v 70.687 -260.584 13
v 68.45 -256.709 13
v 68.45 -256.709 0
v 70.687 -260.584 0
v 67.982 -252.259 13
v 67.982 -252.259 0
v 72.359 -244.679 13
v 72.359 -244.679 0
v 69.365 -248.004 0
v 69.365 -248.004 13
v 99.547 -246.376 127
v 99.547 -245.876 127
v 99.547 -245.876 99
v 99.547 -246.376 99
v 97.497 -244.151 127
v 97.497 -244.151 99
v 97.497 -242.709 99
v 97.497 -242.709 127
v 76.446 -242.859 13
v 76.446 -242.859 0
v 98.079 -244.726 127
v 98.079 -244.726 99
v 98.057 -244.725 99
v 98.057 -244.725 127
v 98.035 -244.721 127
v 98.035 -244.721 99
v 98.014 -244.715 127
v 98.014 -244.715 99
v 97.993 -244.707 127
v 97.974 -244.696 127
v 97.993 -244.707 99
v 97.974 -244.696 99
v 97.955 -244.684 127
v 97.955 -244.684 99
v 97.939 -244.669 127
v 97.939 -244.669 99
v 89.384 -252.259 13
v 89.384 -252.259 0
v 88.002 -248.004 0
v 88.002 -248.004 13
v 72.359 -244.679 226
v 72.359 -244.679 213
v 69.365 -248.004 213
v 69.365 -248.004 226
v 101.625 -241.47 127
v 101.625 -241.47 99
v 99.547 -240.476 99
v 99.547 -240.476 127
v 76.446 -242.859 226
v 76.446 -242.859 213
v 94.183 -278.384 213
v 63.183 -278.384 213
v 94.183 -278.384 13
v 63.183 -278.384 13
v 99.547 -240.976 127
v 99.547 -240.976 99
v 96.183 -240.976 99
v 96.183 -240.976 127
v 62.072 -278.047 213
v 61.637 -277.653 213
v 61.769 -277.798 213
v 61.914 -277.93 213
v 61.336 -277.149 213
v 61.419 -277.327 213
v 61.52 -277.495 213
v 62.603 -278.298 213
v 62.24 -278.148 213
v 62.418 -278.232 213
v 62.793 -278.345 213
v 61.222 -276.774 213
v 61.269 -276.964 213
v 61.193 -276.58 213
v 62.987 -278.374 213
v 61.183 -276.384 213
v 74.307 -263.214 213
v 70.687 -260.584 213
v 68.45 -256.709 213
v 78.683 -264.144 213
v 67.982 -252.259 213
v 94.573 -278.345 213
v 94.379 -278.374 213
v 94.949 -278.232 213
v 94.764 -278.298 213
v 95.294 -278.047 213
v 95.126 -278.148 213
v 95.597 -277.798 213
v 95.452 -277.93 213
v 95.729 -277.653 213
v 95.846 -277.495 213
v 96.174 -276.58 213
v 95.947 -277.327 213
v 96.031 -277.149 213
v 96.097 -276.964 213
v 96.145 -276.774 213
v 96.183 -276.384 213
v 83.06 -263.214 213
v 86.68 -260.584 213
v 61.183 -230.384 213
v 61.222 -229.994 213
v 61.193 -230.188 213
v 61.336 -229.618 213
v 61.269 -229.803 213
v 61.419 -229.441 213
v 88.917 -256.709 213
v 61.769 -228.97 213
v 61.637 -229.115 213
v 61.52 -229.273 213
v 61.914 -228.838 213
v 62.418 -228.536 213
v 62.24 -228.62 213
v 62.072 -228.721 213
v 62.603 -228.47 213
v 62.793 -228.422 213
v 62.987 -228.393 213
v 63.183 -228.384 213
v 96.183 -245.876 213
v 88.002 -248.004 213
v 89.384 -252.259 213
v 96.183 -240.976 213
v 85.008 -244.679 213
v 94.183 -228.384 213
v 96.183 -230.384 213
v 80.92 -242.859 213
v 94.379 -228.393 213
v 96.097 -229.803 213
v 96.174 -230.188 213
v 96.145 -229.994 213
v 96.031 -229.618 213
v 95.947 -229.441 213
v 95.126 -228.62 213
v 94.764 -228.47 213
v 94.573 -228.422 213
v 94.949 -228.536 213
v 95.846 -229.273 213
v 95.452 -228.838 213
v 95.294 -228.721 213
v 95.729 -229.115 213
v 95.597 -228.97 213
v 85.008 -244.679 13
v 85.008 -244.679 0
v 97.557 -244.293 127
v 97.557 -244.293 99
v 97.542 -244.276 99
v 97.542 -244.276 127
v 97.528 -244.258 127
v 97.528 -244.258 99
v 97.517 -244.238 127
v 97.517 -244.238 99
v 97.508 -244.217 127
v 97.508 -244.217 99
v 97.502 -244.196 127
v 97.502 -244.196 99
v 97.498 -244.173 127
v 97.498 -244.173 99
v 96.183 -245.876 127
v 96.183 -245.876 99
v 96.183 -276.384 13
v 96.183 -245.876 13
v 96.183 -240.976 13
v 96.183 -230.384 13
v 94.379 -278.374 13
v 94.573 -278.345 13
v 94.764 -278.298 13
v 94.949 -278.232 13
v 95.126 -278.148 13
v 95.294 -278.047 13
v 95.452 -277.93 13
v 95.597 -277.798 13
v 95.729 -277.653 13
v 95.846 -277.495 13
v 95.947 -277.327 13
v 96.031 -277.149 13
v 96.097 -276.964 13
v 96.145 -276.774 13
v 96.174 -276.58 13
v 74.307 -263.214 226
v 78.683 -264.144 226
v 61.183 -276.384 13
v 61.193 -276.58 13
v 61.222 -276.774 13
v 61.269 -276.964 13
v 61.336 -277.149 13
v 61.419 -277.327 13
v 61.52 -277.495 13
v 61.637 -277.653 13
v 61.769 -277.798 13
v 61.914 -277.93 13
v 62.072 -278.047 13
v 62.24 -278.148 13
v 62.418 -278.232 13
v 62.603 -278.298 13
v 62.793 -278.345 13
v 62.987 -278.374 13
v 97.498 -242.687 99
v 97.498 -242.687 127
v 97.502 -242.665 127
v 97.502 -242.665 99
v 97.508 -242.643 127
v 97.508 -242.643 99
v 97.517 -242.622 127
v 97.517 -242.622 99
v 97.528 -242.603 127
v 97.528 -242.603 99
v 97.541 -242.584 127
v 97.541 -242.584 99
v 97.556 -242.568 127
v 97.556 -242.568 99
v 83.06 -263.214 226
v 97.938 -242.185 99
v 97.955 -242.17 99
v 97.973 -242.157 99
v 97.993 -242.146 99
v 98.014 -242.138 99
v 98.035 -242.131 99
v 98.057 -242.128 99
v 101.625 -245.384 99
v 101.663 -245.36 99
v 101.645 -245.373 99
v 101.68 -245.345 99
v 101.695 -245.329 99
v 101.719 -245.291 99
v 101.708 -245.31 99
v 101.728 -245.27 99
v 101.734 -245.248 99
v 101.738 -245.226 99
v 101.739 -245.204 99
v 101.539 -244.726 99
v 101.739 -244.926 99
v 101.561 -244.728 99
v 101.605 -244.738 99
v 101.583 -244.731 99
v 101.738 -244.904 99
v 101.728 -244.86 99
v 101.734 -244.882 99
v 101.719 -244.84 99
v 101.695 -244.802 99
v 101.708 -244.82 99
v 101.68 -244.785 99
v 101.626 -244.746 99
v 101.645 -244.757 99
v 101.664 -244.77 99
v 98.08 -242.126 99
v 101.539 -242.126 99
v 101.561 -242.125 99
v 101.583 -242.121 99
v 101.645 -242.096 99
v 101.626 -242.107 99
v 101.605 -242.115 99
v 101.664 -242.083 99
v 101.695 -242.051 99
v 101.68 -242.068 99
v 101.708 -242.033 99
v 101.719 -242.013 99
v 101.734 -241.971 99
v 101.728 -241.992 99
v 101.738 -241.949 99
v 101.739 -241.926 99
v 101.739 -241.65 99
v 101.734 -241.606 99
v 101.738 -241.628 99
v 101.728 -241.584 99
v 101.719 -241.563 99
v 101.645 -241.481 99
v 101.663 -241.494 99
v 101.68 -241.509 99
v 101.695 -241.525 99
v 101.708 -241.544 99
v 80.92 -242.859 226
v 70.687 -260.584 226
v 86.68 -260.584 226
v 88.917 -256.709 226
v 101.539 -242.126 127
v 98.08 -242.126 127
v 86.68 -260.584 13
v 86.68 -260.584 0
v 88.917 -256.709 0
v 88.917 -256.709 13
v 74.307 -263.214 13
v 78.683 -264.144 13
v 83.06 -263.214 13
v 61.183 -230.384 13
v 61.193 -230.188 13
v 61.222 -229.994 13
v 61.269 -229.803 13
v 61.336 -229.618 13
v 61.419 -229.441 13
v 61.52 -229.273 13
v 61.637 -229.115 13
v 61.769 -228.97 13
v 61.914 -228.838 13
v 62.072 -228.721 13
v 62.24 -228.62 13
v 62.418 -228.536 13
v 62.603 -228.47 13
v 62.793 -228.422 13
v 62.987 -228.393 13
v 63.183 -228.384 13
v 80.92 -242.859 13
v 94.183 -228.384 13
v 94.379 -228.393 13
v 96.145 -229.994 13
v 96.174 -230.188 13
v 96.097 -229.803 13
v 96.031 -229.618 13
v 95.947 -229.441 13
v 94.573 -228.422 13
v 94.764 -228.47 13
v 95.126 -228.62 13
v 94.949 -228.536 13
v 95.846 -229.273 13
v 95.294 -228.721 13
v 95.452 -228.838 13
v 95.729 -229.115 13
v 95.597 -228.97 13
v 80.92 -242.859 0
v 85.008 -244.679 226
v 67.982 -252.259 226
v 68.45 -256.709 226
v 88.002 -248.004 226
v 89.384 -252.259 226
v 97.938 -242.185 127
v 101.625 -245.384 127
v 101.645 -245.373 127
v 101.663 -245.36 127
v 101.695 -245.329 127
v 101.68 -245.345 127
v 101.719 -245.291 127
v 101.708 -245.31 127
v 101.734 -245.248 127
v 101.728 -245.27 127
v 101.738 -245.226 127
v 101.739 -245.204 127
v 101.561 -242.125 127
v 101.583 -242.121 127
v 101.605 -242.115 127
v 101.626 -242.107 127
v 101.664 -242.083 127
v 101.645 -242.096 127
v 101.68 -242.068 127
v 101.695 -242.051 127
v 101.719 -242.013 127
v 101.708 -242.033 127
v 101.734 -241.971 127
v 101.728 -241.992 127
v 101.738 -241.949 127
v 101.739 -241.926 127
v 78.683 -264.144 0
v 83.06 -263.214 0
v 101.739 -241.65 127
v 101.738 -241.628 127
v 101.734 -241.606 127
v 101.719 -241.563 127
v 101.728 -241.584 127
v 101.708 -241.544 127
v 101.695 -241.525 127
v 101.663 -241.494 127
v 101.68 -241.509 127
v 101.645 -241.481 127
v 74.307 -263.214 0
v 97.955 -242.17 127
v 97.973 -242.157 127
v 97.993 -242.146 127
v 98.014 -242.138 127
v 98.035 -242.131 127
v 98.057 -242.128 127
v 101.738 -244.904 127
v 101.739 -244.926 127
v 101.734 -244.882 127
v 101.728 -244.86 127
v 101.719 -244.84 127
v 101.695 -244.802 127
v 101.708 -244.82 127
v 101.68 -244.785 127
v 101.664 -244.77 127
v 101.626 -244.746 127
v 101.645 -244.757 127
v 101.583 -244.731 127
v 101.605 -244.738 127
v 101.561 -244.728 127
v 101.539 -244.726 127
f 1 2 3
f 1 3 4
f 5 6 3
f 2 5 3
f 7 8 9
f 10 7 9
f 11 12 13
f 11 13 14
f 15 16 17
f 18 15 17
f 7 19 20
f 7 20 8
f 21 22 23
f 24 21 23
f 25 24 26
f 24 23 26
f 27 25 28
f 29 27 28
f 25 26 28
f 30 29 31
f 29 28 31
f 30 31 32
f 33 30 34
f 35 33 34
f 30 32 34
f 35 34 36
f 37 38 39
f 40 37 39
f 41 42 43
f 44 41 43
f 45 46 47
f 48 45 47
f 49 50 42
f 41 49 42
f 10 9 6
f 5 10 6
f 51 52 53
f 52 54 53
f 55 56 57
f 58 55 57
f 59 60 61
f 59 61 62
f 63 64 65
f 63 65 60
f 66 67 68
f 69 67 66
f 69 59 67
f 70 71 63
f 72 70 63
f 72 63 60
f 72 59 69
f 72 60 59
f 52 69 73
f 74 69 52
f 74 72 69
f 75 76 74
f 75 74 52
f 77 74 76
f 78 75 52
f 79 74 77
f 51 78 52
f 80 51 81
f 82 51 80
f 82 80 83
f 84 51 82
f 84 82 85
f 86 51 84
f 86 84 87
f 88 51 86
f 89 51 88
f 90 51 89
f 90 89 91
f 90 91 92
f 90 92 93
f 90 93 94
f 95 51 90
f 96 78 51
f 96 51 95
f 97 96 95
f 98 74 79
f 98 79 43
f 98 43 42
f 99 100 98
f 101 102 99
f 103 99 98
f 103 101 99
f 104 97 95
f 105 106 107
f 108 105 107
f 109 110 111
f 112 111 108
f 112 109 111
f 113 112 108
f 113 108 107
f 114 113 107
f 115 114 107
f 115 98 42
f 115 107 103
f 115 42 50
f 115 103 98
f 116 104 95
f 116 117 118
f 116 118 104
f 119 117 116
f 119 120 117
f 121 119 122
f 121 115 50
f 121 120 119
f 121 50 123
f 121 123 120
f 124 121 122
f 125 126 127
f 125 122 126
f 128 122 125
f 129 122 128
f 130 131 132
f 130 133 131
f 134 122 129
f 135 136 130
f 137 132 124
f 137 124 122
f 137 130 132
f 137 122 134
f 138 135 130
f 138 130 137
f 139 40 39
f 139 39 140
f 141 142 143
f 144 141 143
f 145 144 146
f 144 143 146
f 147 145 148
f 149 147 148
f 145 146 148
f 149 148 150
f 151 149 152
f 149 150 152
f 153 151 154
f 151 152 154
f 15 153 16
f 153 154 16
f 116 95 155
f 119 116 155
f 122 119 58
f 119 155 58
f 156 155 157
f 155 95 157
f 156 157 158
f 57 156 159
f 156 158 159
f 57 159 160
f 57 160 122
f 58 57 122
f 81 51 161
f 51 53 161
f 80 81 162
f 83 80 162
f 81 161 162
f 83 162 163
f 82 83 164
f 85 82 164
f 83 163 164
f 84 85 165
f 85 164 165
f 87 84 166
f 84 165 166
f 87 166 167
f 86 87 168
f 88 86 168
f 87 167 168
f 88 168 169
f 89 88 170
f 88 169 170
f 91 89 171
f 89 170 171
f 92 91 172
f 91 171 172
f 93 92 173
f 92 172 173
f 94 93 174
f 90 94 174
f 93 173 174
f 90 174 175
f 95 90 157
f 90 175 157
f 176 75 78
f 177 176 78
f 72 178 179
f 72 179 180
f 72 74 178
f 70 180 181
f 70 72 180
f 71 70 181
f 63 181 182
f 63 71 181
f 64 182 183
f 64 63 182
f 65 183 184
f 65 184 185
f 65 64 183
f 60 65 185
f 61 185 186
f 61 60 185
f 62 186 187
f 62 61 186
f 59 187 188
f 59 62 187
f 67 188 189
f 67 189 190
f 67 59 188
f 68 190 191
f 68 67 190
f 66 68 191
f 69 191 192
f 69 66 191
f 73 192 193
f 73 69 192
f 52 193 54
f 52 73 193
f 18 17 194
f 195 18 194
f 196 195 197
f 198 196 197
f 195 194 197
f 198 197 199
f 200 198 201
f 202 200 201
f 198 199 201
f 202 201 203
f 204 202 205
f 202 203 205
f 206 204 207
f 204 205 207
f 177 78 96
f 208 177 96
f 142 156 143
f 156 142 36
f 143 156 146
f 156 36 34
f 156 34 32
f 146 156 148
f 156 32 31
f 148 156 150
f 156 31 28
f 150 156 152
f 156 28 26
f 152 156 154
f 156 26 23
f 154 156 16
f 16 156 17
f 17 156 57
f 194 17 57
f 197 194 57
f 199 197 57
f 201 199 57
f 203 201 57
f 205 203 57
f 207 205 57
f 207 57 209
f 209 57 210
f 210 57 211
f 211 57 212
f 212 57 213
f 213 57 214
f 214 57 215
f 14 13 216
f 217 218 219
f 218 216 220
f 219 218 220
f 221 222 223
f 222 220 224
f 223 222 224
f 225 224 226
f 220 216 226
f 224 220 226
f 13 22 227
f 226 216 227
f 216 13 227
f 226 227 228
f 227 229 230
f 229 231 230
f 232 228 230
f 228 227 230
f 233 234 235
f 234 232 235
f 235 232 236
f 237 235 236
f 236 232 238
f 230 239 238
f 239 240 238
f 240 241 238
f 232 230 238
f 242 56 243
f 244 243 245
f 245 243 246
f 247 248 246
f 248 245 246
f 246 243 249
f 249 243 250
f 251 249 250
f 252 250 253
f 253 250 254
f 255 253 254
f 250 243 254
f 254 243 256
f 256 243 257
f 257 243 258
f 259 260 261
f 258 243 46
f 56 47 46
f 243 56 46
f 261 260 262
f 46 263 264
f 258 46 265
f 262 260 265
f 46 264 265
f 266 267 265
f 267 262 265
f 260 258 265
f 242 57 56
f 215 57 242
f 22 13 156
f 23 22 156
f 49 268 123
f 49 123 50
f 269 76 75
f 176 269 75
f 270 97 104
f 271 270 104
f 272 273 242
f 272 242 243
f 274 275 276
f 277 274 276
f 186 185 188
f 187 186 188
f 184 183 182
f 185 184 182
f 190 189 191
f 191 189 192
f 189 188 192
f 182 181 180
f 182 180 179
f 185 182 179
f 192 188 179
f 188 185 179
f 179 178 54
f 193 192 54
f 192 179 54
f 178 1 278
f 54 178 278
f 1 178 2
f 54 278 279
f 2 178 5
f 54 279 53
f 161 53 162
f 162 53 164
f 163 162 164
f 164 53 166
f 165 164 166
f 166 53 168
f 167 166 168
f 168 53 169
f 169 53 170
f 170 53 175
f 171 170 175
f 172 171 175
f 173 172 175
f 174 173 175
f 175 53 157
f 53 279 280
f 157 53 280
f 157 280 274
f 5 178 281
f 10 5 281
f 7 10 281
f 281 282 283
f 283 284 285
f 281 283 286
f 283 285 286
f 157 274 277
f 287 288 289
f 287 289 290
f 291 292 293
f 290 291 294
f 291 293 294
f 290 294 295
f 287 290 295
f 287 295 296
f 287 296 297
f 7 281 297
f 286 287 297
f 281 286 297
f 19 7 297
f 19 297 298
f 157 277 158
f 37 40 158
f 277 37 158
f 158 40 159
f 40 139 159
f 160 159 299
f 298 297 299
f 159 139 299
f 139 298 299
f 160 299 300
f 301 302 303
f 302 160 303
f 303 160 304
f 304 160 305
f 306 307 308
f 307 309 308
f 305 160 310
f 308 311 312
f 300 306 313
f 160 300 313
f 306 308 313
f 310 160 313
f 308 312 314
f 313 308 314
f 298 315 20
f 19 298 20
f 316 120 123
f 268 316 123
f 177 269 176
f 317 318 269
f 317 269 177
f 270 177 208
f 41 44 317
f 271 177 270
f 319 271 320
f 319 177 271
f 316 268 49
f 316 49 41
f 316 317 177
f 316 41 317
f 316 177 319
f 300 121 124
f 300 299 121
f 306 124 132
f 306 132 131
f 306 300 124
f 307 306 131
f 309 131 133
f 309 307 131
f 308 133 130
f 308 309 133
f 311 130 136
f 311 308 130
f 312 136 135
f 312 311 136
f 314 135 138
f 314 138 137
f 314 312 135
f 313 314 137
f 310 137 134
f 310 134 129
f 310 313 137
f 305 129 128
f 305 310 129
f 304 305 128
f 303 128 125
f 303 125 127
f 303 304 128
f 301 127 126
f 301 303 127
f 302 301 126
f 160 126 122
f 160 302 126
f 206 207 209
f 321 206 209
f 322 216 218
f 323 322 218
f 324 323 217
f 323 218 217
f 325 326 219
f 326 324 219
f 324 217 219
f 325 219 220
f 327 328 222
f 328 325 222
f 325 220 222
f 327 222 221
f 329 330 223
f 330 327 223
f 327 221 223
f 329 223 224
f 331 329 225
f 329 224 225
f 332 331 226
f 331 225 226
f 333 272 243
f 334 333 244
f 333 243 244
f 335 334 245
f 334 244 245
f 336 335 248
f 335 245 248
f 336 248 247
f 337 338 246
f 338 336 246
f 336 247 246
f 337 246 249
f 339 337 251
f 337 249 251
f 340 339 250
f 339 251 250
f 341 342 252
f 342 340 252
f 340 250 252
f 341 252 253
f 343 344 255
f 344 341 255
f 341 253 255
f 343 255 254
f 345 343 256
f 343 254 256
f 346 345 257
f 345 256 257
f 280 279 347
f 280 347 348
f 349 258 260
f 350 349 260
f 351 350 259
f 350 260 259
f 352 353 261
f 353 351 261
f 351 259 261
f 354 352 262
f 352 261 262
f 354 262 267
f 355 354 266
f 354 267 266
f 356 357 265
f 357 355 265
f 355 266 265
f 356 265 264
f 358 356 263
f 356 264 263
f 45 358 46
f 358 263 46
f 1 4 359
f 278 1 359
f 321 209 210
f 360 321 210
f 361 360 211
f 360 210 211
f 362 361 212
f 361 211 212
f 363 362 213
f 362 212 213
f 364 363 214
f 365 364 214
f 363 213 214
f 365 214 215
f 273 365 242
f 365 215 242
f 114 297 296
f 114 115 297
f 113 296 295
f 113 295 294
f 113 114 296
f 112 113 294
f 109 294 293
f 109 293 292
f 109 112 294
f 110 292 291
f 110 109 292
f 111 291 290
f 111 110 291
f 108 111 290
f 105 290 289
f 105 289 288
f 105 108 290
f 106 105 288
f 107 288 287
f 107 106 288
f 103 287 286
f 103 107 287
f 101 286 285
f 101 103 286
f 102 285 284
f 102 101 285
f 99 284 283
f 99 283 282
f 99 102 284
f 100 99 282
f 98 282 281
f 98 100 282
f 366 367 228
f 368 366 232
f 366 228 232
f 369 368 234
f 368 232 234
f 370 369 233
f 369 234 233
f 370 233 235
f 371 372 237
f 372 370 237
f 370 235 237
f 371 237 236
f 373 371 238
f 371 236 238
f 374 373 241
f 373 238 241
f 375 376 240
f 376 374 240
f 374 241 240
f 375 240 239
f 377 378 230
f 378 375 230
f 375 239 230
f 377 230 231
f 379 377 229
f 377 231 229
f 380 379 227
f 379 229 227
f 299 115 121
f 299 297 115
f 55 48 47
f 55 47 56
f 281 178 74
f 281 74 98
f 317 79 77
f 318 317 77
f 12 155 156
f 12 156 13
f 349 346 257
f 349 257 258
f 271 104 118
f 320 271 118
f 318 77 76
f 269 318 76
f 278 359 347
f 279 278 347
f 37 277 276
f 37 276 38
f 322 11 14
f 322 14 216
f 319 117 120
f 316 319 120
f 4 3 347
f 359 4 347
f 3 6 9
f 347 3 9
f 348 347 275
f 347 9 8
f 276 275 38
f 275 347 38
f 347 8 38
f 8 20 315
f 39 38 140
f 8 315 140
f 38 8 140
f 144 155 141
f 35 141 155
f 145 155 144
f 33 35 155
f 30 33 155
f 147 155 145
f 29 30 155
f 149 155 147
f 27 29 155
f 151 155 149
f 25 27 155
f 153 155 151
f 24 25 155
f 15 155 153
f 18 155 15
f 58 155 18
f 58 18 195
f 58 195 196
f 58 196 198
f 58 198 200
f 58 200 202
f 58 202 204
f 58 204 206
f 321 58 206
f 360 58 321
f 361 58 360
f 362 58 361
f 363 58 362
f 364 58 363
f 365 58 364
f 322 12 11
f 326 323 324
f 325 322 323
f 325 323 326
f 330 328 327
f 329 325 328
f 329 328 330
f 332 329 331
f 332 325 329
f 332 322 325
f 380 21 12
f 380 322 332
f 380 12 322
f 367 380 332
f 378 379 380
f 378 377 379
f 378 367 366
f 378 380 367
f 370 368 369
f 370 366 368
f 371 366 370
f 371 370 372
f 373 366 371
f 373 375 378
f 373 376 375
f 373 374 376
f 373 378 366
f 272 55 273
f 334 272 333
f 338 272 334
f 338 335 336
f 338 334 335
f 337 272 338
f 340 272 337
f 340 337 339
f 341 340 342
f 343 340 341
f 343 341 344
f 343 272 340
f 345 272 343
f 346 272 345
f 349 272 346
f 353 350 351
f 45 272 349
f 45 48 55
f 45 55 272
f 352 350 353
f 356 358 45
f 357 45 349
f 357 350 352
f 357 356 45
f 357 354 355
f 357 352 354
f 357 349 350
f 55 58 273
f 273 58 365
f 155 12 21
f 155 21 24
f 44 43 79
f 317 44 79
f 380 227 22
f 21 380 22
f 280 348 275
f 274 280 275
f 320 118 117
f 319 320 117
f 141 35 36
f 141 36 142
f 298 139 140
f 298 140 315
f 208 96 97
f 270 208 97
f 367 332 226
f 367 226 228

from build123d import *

# Parameters (mm, degrees)
BOSS_EXTRUDE6_DEPTH     = 13
SKETCH10_W              = 35
SKETCH10_H              = 50
BOSS_EXTRUDE7_DEPTH     = 200
BOSS_EXTRUDE8_DEPTH     = 13
BOSS_EXTRUDE10_DEPTH    = 200
FILLET2_R               = 0.2
FILLET3_R               = 0.2
SKETCH13_W              = 69.491392083
SKETCH13_H              = 95.024424652
SKETCH13_W_2            = 70.992171295
SKETCH13_H_2            = 120
CUT_EXTRUDE1_DEPTH      = 40
CUT_EXTRUDE1_DEPTH_BACK = 40
FILLET4_R               = 2


with BuildPart() as part:
    # Sketch9 → Boss-Extrude6 (new body)
    with BuildSketch(Plane(origin=(54.235591649, 0, 0), x_dir=(1, 0, 0), z_dir=(0, 0, 1))):
        Polygon((26.684813292, -242.858935562), (22.210553706, -242.858935562), (18.123114185, -244.678780887), (15.129250155, -248.003803746), (13.746627905, -252.259077482), (14.214315384, -256.708826606), (16.451445177, -260.583649071), (20.07119722, -263.213552871), (24.447683499, -264.143803746), (28.824169779, -263.213552871), (32.443921821, -260.583649071), (34.681051615, -256.708826606), (35.148739093, -252.259077482), (33.766116844, -248.003803746), (30.772252814, -244.678780887), align=None)
    extrude(amount=BOSS_EXTRUDE6_DEPTH)

    # Sketch10 → Boss-Extrude7 (add)
    with BuildSketch(Plane.XY.offset(13)):
        with Locations((78.683275149, -253.383803746)):
            Rectangle(SKETCH10_W, SKETCH10_H)
    extrude(amount=BOSS_EXTRUDE7_DEPTH)

    # Sketch11 → Boss-Extrude8 (add)
    with BuildSketch(Plane.XY.offset(213)):
        Polygon((78.683275149, -264.143803746), (83.059761428, -263.213552871), (86.679513471, -260.583649071), (88.916643264, -256.708826606), (89.384330743, -252.259077482), (88.001708493, -248.003803746), (85.007844463, -244.678780887), (80.920404942, -242.858935562), (76.446145356, -242.858935562), (72.358705834, -244.678780887), (69.364841804, -248.003803746), (67.982219555, -252.259077482), (68.449907033, -256.708826606), (70.687036827, -260.583649071), (74.306788869, -263.213552871), align=None)
    extrude(amount=BOSS_EXTRUDE8_DEPTH)

    # Sketch12 → Boss-Extrude10 (add)
    with BuildSketch(Plane.XY.offset(213)):
        Polygon((99.546985742, -240.476339651), (99.546985742, -240.976339651), (96.183275149, -240.976339651), (96.183275149, -245.876341177), (99.546985742, -245.876341177), (99.546985742, -246.376341177), (101.738909258, -245.329800525), (101.738909258, -244.726339651), (97.997187134, -244.726339651), (97.496982691, -244.234356535), (97.496982691, -242.626350386), (97.99698111, -242.126341177), (101.738909258, -242.126341177), (101.738909258, -241.524181899), align=None)
    extrude(amount=-BOSS_EXTRUDE10_DEPTH)

    # Fillet2
    fillet2_edges = [part.edges().sort_by_distance(p)[0] for p in [
        (101.738909258, -241.524181899, 113),
        (101.738909258, -242.126341177, 113),
        (97.99698111, -242.126341177, 113),
        (97.496982691, -242.626350386, 113),
        (97.496982691, -244.234356535, 113),
        (97.997187134, -244.726339651, 113),
        (101.738909258, -245.329800525, 113),
    ]]
    fillet(fillet2_edges, radius=FILLET2_R)

    # Fillet3
    fillet3_edges = [part.edges().sort_by_distance(p)[0] for p in [
        (101.738909258, -244.726339651, 113),
    ]]
    fillet(fillet3_edges, radius=FILLET3_R)

    # Sketch13 → Cut-Extrude1 (cut, two sides)
    with BuildSketch(Plane(origin=(0, -240.976339651, 0), x_dir=(1, 0, 0), z_dir=(0, 1, 0))) as cut_extrude1_sk:
        with Locations((130.928971191, -51.487787674)):
            Rectangle(SKETCH13_W, SKETCH13_H)
        with Locations((131.679360797, -187)):
            Rectangle(SKETCH13_W_2, SKETCH13_H_2)
    extrude(amount=CUT_EXTRUDE1_DEPTH, mode=Mode.SUBTRACT)
    extrude(cut_extrude1_sk.sketch, amount=-CUT_EXTRUDE1_DEPTH_BACK, mode=Mode.SUBTRACT)

    # Fillet4
    fillet4_edges = [part.edges().sort_by_distance(p)[0] for p in [
        (96.183275149, -278.383803746, 113),
        (96.183275149, -228.383803746, 113),
        (61.183275149, -228.383803746, 113),
        (61.183275149, -278.383803746, 113),
    ]]
    fillet(fillet4_edges, radius=FILLET4_R)


solid = part.part
